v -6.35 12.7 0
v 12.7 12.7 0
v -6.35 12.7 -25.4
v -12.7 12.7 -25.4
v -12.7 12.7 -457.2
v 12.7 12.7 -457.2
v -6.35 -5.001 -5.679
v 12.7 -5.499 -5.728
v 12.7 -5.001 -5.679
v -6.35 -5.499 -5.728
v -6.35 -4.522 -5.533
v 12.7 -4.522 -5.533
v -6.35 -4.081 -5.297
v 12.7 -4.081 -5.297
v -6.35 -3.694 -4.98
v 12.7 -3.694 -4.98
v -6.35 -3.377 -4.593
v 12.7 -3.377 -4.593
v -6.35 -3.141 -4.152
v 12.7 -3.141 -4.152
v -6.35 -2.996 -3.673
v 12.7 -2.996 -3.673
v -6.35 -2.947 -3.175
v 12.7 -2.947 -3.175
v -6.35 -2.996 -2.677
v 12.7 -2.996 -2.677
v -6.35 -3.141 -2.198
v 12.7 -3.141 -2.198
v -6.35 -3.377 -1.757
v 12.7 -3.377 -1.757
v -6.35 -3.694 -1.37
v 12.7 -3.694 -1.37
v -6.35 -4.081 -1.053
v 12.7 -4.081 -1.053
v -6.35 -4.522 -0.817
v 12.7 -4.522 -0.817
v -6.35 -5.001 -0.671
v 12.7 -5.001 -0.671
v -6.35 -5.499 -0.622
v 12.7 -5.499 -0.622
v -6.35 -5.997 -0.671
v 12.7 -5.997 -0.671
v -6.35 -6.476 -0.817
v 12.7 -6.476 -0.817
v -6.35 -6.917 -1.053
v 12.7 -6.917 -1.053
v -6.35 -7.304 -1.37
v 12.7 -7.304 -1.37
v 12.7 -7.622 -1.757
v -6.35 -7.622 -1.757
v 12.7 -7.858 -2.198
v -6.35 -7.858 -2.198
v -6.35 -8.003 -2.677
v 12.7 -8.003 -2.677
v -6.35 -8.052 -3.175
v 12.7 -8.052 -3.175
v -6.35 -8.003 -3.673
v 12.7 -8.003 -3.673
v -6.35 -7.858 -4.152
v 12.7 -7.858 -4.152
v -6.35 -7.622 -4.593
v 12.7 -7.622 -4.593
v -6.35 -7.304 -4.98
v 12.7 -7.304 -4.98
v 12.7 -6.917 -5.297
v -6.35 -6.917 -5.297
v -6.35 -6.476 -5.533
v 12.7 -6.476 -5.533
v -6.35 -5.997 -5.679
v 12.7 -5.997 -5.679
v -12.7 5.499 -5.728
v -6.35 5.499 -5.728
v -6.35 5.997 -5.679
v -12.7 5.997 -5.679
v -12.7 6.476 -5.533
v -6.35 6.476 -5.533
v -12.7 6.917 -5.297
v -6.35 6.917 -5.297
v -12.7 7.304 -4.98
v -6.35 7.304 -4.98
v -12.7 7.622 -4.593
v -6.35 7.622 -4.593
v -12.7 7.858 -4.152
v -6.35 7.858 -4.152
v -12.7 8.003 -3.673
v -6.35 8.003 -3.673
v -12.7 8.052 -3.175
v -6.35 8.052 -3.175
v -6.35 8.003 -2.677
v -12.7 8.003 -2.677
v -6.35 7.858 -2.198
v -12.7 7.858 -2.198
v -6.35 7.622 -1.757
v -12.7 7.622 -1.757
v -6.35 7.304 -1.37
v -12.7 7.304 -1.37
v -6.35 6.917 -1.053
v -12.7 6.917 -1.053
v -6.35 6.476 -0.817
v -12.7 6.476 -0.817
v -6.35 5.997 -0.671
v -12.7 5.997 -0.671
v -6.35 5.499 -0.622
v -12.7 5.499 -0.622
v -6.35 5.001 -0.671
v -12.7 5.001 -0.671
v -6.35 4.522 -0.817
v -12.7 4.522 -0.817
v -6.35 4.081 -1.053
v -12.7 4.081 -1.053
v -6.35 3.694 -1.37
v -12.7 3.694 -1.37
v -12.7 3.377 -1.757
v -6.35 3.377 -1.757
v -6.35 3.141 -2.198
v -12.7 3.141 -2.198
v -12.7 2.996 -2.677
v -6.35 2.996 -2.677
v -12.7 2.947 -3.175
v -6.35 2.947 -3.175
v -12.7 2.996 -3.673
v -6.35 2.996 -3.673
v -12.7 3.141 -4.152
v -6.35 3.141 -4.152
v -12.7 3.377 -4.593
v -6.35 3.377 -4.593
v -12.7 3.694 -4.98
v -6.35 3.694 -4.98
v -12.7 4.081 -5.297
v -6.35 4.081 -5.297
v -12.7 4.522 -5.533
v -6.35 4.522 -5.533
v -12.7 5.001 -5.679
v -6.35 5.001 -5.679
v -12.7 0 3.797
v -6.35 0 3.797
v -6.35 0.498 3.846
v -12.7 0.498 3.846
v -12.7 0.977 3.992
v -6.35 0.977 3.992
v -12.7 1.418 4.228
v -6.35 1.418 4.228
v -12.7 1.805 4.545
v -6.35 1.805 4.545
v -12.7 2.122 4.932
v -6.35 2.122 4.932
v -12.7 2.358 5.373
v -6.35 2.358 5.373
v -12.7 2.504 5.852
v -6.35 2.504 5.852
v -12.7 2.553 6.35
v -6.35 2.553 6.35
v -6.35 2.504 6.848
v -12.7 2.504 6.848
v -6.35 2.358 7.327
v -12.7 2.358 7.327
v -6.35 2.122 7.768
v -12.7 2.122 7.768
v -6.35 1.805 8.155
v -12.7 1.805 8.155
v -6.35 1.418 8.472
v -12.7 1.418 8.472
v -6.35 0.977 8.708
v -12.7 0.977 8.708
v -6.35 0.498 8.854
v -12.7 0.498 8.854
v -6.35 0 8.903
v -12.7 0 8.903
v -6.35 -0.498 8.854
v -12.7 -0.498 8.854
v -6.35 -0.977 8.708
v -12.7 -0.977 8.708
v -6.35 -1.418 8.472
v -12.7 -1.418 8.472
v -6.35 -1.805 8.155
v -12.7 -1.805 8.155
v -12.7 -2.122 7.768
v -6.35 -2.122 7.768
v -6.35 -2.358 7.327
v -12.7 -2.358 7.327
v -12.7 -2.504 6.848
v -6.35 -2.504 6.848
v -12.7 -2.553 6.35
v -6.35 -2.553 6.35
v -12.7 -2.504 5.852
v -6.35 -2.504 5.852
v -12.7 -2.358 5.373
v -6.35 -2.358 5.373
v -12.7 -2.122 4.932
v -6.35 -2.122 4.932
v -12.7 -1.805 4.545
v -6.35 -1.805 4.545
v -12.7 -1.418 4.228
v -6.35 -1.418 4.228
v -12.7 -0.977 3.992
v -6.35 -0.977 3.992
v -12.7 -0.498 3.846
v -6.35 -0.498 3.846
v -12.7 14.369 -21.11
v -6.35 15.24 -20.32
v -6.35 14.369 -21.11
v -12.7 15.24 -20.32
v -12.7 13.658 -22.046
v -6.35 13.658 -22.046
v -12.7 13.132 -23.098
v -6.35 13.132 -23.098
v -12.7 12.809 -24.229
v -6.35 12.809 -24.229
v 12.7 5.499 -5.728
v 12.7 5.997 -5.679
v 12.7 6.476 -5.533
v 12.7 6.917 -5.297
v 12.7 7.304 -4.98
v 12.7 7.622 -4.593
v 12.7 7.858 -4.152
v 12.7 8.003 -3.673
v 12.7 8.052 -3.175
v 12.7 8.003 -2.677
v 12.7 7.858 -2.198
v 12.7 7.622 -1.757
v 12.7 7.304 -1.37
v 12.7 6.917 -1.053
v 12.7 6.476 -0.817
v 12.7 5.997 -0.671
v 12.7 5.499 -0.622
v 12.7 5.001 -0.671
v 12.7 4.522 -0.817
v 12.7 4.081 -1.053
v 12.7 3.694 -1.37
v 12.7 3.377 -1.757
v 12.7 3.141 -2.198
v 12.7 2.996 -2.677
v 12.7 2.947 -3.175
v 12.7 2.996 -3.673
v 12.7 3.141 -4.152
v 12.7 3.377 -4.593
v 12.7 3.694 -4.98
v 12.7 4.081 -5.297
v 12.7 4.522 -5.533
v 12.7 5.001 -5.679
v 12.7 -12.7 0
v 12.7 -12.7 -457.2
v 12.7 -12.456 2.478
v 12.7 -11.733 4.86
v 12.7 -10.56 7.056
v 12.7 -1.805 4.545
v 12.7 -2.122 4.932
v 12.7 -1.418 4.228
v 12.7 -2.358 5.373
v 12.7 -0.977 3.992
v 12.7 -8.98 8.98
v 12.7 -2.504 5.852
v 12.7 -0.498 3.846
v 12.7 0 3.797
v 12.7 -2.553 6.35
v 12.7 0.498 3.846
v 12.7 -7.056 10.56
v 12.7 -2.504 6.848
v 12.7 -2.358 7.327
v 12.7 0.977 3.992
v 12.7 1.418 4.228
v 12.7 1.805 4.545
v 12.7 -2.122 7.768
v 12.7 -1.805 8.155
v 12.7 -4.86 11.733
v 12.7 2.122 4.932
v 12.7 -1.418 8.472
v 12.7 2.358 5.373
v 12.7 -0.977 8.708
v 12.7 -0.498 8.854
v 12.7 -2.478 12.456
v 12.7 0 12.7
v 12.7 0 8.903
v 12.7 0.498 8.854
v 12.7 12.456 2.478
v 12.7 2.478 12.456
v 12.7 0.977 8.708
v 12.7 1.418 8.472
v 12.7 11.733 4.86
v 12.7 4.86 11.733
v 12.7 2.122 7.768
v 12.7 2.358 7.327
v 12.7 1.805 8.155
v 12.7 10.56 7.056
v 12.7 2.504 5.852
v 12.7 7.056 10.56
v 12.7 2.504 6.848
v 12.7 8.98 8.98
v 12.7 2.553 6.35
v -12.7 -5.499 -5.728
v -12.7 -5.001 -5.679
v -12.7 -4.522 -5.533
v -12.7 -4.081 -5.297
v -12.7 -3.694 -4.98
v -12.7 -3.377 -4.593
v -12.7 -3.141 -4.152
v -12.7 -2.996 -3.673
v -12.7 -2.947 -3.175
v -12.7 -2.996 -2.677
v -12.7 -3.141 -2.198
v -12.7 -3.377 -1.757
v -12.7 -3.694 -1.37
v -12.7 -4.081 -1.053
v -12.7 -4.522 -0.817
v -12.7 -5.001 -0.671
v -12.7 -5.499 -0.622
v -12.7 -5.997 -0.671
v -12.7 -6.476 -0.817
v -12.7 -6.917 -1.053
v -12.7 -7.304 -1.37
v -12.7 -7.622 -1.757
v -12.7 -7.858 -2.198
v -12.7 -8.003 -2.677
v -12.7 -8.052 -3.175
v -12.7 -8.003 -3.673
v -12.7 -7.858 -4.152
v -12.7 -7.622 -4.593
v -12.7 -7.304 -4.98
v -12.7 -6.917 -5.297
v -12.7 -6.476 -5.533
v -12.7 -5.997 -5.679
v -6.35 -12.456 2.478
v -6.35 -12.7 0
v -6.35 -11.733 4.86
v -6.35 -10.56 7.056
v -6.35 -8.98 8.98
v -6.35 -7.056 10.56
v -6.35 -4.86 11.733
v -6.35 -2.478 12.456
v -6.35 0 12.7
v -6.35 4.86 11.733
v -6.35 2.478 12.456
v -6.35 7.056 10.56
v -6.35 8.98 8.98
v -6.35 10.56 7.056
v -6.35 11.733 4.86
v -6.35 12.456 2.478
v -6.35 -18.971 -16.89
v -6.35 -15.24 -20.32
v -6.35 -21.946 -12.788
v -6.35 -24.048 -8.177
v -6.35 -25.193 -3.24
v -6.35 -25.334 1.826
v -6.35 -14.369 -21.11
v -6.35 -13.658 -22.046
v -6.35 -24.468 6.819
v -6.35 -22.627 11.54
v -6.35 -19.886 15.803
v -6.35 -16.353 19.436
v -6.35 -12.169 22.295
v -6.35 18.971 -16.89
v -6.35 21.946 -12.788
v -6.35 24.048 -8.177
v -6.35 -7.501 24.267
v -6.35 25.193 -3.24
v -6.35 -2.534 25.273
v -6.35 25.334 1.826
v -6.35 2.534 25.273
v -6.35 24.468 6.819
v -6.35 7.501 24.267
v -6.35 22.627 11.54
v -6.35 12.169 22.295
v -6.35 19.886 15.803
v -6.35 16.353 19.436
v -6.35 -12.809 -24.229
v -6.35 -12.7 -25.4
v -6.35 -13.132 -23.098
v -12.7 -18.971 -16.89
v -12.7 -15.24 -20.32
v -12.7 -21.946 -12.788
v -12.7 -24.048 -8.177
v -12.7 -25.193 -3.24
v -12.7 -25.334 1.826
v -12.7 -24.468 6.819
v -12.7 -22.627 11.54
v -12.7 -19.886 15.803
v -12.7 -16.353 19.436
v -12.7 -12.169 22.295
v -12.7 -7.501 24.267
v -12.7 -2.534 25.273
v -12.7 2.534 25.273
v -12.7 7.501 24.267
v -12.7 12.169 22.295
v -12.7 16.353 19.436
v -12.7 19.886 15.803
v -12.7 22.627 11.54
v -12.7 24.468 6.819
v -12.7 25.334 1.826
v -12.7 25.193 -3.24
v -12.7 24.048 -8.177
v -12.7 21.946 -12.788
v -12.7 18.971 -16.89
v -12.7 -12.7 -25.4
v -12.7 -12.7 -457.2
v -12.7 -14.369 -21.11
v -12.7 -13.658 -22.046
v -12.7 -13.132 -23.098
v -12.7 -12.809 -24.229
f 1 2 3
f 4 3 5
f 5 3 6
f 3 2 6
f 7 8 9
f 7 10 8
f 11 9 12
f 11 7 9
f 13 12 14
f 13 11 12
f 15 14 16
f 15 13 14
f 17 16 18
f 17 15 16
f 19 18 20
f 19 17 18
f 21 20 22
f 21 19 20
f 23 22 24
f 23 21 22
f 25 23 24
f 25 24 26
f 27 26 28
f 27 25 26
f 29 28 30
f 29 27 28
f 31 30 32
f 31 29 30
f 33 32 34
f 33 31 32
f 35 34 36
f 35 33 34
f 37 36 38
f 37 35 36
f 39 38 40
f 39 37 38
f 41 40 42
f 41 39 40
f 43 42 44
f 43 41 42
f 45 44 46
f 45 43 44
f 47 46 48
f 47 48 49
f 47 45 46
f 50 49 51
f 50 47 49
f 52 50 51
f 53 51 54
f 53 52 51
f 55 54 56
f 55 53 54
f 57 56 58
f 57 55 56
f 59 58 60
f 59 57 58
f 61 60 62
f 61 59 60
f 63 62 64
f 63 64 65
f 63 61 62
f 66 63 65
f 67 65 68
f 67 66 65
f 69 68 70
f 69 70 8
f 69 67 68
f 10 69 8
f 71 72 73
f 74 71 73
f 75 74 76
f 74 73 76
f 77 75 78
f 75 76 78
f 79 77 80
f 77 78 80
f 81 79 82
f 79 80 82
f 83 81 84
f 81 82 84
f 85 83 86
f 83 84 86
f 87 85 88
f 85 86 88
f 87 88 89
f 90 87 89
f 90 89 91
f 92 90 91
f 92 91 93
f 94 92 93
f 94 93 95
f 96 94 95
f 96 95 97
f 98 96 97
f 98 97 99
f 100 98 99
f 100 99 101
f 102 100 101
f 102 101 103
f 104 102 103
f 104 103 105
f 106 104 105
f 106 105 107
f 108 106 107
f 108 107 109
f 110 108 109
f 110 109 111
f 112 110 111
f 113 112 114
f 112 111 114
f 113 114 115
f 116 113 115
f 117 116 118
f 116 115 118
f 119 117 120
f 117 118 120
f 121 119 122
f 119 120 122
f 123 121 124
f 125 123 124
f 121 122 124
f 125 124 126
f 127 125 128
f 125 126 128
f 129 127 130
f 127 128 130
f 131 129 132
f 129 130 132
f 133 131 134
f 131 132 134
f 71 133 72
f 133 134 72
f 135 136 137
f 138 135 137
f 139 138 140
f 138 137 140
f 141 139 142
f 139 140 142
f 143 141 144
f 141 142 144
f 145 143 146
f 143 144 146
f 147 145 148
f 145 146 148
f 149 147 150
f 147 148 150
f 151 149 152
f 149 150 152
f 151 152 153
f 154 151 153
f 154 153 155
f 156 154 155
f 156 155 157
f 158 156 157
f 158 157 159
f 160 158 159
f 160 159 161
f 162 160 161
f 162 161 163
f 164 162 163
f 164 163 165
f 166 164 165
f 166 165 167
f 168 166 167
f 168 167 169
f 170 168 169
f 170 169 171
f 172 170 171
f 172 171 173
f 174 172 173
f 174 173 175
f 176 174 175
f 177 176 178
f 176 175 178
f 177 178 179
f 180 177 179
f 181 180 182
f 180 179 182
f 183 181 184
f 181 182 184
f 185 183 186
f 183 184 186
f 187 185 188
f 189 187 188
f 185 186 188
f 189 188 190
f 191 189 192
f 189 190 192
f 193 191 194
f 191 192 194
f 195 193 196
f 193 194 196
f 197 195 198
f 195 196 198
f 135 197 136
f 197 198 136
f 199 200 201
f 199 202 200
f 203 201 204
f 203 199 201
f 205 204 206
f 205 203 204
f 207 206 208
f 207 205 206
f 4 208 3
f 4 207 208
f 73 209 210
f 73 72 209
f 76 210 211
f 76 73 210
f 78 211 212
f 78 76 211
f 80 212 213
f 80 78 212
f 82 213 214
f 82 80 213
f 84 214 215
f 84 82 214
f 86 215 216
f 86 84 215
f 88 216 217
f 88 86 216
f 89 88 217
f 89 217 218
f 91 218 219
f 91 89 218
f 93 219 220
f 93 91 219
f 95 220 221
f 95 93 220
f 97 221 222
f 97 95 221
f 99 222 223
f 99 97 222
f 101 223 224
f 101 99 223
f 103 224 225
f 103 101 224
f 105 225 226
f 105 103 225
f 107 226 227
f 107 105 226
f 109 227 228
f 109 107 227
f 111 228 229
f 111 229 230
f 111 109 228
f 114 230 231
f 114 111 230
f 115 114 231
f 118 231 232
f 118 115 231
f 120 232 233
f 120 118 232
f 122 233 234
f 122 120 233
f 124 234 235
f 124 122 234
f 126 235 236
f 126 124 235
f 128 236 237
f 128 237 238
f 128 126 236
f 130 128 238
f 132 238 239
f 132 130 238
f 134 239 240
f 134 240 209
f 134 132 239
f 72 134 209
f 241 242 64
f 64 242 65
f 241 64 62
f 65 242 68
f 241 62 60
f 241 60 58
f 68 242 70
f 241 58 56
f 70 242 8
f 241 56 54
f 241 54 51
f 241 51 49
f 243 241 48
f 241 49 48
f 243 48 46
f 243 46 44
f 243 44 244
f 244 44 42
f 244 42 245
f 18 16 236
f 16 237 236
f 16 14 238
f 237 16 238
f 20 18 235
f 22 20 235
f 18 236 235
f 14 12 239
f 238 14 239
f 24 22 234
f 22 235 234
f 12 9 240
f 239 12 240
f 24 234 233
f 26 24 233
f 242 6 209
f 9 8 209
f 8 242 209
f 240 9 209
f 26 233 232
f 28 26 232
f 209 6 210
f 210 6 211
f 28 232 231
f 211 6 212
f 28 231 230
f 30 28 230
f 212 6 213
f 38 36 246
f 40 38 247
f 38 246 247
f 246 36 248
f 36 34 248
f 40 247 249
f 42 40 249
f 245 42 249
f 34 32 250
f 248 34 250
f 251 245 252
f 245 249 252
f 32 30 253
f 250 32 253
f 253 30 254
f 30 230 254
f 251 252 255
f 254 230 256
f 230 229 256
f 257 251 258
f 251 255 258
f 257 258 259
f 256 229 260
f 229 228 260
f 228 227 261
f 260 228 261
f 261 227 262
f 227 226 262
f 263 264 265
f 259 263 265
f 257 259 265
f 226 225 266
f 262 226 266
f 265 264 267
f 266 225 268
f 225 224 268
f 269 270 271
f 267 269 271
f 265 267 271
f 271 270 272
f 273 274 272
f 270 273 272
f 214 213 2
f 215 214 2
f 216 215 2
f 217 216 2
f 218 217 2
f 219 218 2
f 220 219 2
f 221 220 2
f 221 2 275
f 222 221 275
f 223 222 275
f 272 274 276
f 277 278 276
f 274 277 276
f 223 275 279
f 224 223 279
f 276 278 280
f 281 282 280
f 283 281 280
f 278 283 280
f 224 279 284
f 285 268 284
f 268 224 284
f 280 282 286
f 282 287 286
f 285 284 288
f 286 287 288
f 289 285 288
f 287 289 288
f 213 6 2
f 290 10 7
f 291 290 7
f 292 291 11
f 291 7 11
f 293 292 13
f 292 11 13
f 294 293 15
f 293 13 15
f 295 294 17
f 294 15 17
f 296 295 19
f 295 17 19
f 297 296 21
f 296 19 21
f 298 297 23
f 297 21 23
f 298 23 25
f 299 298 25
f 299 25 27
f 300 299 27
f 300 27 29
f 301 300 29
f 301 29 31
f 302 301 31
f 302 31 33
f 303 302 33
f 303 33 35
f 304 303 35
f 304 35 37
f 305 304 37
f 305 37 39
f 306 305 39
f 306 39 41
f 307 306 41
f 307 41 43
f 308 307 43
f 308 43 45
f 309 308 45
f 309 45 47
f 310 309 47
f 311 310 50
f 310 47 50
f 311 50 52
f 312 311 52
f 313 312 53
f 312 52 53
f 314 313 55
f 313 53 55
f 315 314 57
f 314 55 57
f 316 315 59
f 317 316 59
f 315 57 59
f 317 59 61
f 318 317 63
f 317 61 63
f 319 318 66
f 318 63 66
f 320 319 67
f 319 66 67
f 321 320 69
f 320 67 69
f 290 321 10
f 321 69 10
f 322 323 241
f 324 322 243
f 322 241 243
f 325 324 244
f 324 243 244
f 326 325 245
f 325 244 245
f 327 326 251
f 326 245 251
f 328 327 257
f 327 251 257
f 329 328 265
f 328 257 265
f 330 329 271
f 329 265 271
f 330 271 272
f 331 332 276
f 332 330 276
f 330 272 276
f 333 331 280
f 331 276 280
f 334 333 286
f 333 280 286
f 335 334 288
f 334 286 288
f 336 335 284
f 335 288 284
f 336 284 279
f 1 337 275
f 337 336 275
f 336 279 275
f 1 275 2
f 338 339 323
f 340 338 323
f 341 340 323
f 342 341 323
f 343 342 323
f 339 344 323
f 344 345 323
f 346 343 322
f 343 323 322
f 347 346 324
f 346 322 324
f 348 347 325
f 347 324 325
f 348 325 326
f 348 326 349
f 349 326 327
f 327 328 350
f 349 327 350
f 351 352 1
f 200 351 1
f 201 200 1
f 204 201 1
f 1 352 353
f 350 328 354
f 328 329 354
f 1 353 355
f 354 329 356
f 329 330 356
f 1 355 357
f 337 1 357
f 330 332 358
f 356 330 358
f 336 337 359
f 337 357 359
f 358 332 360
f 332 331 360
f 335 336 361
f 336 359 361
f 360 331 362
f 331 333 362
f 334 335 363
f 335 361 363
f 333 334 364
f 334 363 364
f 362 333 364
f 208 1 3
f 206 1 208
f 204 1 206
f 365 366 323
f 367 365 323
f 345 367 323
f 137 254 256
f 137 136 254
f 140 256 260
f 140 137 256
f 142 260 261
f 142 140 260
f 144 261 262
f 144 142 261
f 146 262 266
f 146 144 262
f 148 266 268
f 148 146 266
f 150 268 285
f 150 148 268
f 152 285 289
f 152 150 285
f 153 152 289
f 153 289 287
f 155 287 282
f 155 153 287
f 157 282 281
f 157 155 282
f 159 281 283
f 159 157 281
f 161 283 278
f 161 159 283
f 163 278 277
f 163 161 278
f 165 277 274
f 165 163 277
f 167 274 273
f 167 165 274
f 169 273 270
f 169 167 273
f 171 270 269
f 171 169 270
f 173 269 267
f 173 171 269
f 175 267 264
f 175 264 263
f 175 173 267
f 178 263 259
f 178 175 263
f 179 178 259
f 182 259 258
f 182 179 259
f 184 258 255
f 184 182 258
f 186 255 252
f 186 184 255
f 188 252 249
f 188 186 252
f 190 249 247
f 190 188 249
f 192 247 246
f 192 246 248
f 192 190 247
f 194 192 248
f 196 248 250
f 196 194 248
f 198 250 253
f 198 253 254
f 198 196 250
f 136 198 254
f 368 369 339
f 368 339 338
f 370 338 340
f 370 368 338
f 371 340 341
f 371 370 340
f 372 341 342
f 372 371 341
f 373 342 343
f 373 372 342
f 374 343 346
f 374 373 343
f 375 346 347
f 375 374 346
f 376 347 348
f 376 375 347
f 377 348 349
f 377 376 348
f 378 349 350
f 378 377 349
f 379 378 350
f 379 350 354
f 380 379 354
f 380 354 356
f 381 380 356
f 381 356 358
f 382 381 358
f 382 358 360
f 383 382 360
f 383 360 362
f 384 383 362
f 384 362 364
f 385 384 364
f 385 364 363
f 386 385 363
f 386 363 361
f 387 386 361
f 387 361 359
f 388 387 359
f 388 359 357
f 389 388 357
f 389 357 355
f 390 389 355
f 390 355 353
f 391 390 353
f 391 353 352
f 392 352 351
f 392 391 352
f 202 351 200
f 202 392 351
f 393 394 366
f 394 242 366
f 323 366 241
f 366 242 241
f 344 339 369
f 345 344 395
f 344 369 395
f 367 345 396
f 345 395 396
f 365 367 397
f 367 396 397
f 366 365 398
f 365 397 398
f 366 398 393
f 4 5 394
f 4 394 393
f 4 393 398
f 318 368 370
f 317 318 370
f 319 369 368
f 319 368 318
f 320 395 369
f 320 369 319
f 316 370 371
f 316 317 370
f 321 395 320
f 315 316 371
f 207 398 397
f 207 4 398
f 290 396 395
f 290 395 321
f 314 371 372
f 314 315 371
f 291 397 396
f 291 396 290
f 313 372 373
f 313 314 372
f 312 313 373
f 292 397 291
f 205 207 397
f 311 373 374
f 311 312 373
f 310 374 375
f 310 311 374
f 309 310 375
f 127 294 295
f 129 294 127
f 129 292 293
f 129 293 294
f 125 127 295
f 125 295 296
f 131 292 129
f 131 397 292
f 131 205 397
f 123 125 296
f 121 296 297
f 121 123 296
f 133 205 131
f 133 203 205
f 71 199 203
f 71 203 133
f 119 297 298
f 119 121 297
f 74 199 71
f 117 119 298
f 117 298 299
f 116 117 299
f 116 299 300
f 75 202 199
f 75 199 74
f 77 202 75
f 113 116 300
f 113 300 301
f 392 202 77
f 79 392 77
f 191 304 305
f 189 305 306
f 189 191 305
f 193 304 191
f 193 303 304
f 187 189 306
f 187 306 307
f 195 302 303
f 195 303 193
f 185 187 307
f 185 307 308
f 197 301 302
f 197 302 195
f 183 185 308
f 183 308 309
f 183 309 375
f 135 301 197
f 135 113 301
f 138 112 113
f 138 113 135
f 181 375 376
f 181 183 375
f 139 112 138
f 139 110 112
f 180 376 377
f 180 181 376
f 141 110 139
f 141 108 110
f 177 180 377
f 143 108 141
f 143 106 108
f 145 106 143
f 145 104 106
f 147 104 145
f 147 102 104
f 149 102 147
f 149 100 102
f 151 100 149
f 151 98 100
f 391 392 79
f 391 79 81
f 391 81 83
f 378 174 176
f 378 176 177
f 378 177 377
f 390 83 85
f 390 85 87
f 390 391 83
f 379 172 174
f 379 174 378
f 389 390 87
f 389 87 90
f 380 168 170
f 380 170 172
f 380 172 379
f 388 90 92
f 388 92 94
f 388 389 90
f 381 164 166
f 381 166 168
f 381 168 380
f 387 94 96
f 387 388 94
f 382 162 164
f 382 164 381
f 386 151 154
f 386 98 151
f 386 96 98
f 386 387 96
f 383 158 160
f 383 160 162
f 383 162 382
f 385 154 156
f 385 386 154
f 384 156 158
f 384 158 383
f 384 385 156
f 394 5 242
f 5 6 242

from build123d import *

# Parameters (mm, degrees)
SKETCH1_R           = 2.5527
BOSS_EXTRUDE1_DEPTH = 12.7
SKETCH3_R           = 25.4
BOSS_EXTRUDE2_DEPTH = 6.35
SKETCH4_R           = 2.5527
CUT_EXTRUDE1_DEPTH  = 459.301104624
FILLET1_R           = 6.35


with BuildPart() as part:
    # Sketch1 → Boss-Extrude1 (new, symmetric)
    with BuildSketch(Plane(origin=(0, 0, 0), x_dir=(0, 0, -1), z_dir=(1, 0, 0))):
        with BuildLine():
            Line((0, 12.7), (457.2, 12.7))
            Line((457.2, 12.7), (457.2, -12.7))
            Line((457.2, -12.7), (0, -12.7))
            ThreePointArc((0, -12.7), (-12.7, 0), (0, 12.7))
        make_face()
        with Locations((3.175, 5.499261314)):
            Circle(SKETCH1_R, mode=Mode.SUBTRACT)
        with Locations((-6.35, 0)):
            Circle(SKETCH1_R, mode=Mode.SUBTRACT)
        with Locations((3.175, -5.499261314)):
            Circle(SKETCH1_R, mode=Mode.SUBTRACT)
    extrude(amount=BOSS_EXTRUDE1_DEPTH, both=True)

    # Sketch3 → Boss-Extrude2 (add)
    with BuildSketch(Plane.ZY.offset(12.7)):
        Circle(SKETCH3_R)
    extrude(amount=-BOSS_EXTRUDE2_DEPTH)

    # Sketch4 → Cut-Extrude1 (cut, through all)
    with BuildSketch(Plane(origin=(-6.35, 0, 0), x_dir=(0, 0, -1), z_dir=(1, 0, 0))):
        with Locations((3.175, 5.499261314)):
            Circle(SKETCH4_R)
        with Locations((3.175, -5.499261314)):
            Circle(SKETCH4_R)
        with Locations((-6.35, 0)):
            Circle(SKETCH4_R)
    extrude(amount=-CUT_EXTRUDE1_DEPTH, mode=Mode.SUBTRACT)

    # Fillet1
    fillet1_edges = [part.edges().sort_by_distance(p)[0] for p in [
        (-9.525, 12.7, -21.997045256),
        (-9.525, -12.7, -21.997045256),
    ]]
    fillet(fillet1_edges, radius=FILLET1_R)


solid = part.part
